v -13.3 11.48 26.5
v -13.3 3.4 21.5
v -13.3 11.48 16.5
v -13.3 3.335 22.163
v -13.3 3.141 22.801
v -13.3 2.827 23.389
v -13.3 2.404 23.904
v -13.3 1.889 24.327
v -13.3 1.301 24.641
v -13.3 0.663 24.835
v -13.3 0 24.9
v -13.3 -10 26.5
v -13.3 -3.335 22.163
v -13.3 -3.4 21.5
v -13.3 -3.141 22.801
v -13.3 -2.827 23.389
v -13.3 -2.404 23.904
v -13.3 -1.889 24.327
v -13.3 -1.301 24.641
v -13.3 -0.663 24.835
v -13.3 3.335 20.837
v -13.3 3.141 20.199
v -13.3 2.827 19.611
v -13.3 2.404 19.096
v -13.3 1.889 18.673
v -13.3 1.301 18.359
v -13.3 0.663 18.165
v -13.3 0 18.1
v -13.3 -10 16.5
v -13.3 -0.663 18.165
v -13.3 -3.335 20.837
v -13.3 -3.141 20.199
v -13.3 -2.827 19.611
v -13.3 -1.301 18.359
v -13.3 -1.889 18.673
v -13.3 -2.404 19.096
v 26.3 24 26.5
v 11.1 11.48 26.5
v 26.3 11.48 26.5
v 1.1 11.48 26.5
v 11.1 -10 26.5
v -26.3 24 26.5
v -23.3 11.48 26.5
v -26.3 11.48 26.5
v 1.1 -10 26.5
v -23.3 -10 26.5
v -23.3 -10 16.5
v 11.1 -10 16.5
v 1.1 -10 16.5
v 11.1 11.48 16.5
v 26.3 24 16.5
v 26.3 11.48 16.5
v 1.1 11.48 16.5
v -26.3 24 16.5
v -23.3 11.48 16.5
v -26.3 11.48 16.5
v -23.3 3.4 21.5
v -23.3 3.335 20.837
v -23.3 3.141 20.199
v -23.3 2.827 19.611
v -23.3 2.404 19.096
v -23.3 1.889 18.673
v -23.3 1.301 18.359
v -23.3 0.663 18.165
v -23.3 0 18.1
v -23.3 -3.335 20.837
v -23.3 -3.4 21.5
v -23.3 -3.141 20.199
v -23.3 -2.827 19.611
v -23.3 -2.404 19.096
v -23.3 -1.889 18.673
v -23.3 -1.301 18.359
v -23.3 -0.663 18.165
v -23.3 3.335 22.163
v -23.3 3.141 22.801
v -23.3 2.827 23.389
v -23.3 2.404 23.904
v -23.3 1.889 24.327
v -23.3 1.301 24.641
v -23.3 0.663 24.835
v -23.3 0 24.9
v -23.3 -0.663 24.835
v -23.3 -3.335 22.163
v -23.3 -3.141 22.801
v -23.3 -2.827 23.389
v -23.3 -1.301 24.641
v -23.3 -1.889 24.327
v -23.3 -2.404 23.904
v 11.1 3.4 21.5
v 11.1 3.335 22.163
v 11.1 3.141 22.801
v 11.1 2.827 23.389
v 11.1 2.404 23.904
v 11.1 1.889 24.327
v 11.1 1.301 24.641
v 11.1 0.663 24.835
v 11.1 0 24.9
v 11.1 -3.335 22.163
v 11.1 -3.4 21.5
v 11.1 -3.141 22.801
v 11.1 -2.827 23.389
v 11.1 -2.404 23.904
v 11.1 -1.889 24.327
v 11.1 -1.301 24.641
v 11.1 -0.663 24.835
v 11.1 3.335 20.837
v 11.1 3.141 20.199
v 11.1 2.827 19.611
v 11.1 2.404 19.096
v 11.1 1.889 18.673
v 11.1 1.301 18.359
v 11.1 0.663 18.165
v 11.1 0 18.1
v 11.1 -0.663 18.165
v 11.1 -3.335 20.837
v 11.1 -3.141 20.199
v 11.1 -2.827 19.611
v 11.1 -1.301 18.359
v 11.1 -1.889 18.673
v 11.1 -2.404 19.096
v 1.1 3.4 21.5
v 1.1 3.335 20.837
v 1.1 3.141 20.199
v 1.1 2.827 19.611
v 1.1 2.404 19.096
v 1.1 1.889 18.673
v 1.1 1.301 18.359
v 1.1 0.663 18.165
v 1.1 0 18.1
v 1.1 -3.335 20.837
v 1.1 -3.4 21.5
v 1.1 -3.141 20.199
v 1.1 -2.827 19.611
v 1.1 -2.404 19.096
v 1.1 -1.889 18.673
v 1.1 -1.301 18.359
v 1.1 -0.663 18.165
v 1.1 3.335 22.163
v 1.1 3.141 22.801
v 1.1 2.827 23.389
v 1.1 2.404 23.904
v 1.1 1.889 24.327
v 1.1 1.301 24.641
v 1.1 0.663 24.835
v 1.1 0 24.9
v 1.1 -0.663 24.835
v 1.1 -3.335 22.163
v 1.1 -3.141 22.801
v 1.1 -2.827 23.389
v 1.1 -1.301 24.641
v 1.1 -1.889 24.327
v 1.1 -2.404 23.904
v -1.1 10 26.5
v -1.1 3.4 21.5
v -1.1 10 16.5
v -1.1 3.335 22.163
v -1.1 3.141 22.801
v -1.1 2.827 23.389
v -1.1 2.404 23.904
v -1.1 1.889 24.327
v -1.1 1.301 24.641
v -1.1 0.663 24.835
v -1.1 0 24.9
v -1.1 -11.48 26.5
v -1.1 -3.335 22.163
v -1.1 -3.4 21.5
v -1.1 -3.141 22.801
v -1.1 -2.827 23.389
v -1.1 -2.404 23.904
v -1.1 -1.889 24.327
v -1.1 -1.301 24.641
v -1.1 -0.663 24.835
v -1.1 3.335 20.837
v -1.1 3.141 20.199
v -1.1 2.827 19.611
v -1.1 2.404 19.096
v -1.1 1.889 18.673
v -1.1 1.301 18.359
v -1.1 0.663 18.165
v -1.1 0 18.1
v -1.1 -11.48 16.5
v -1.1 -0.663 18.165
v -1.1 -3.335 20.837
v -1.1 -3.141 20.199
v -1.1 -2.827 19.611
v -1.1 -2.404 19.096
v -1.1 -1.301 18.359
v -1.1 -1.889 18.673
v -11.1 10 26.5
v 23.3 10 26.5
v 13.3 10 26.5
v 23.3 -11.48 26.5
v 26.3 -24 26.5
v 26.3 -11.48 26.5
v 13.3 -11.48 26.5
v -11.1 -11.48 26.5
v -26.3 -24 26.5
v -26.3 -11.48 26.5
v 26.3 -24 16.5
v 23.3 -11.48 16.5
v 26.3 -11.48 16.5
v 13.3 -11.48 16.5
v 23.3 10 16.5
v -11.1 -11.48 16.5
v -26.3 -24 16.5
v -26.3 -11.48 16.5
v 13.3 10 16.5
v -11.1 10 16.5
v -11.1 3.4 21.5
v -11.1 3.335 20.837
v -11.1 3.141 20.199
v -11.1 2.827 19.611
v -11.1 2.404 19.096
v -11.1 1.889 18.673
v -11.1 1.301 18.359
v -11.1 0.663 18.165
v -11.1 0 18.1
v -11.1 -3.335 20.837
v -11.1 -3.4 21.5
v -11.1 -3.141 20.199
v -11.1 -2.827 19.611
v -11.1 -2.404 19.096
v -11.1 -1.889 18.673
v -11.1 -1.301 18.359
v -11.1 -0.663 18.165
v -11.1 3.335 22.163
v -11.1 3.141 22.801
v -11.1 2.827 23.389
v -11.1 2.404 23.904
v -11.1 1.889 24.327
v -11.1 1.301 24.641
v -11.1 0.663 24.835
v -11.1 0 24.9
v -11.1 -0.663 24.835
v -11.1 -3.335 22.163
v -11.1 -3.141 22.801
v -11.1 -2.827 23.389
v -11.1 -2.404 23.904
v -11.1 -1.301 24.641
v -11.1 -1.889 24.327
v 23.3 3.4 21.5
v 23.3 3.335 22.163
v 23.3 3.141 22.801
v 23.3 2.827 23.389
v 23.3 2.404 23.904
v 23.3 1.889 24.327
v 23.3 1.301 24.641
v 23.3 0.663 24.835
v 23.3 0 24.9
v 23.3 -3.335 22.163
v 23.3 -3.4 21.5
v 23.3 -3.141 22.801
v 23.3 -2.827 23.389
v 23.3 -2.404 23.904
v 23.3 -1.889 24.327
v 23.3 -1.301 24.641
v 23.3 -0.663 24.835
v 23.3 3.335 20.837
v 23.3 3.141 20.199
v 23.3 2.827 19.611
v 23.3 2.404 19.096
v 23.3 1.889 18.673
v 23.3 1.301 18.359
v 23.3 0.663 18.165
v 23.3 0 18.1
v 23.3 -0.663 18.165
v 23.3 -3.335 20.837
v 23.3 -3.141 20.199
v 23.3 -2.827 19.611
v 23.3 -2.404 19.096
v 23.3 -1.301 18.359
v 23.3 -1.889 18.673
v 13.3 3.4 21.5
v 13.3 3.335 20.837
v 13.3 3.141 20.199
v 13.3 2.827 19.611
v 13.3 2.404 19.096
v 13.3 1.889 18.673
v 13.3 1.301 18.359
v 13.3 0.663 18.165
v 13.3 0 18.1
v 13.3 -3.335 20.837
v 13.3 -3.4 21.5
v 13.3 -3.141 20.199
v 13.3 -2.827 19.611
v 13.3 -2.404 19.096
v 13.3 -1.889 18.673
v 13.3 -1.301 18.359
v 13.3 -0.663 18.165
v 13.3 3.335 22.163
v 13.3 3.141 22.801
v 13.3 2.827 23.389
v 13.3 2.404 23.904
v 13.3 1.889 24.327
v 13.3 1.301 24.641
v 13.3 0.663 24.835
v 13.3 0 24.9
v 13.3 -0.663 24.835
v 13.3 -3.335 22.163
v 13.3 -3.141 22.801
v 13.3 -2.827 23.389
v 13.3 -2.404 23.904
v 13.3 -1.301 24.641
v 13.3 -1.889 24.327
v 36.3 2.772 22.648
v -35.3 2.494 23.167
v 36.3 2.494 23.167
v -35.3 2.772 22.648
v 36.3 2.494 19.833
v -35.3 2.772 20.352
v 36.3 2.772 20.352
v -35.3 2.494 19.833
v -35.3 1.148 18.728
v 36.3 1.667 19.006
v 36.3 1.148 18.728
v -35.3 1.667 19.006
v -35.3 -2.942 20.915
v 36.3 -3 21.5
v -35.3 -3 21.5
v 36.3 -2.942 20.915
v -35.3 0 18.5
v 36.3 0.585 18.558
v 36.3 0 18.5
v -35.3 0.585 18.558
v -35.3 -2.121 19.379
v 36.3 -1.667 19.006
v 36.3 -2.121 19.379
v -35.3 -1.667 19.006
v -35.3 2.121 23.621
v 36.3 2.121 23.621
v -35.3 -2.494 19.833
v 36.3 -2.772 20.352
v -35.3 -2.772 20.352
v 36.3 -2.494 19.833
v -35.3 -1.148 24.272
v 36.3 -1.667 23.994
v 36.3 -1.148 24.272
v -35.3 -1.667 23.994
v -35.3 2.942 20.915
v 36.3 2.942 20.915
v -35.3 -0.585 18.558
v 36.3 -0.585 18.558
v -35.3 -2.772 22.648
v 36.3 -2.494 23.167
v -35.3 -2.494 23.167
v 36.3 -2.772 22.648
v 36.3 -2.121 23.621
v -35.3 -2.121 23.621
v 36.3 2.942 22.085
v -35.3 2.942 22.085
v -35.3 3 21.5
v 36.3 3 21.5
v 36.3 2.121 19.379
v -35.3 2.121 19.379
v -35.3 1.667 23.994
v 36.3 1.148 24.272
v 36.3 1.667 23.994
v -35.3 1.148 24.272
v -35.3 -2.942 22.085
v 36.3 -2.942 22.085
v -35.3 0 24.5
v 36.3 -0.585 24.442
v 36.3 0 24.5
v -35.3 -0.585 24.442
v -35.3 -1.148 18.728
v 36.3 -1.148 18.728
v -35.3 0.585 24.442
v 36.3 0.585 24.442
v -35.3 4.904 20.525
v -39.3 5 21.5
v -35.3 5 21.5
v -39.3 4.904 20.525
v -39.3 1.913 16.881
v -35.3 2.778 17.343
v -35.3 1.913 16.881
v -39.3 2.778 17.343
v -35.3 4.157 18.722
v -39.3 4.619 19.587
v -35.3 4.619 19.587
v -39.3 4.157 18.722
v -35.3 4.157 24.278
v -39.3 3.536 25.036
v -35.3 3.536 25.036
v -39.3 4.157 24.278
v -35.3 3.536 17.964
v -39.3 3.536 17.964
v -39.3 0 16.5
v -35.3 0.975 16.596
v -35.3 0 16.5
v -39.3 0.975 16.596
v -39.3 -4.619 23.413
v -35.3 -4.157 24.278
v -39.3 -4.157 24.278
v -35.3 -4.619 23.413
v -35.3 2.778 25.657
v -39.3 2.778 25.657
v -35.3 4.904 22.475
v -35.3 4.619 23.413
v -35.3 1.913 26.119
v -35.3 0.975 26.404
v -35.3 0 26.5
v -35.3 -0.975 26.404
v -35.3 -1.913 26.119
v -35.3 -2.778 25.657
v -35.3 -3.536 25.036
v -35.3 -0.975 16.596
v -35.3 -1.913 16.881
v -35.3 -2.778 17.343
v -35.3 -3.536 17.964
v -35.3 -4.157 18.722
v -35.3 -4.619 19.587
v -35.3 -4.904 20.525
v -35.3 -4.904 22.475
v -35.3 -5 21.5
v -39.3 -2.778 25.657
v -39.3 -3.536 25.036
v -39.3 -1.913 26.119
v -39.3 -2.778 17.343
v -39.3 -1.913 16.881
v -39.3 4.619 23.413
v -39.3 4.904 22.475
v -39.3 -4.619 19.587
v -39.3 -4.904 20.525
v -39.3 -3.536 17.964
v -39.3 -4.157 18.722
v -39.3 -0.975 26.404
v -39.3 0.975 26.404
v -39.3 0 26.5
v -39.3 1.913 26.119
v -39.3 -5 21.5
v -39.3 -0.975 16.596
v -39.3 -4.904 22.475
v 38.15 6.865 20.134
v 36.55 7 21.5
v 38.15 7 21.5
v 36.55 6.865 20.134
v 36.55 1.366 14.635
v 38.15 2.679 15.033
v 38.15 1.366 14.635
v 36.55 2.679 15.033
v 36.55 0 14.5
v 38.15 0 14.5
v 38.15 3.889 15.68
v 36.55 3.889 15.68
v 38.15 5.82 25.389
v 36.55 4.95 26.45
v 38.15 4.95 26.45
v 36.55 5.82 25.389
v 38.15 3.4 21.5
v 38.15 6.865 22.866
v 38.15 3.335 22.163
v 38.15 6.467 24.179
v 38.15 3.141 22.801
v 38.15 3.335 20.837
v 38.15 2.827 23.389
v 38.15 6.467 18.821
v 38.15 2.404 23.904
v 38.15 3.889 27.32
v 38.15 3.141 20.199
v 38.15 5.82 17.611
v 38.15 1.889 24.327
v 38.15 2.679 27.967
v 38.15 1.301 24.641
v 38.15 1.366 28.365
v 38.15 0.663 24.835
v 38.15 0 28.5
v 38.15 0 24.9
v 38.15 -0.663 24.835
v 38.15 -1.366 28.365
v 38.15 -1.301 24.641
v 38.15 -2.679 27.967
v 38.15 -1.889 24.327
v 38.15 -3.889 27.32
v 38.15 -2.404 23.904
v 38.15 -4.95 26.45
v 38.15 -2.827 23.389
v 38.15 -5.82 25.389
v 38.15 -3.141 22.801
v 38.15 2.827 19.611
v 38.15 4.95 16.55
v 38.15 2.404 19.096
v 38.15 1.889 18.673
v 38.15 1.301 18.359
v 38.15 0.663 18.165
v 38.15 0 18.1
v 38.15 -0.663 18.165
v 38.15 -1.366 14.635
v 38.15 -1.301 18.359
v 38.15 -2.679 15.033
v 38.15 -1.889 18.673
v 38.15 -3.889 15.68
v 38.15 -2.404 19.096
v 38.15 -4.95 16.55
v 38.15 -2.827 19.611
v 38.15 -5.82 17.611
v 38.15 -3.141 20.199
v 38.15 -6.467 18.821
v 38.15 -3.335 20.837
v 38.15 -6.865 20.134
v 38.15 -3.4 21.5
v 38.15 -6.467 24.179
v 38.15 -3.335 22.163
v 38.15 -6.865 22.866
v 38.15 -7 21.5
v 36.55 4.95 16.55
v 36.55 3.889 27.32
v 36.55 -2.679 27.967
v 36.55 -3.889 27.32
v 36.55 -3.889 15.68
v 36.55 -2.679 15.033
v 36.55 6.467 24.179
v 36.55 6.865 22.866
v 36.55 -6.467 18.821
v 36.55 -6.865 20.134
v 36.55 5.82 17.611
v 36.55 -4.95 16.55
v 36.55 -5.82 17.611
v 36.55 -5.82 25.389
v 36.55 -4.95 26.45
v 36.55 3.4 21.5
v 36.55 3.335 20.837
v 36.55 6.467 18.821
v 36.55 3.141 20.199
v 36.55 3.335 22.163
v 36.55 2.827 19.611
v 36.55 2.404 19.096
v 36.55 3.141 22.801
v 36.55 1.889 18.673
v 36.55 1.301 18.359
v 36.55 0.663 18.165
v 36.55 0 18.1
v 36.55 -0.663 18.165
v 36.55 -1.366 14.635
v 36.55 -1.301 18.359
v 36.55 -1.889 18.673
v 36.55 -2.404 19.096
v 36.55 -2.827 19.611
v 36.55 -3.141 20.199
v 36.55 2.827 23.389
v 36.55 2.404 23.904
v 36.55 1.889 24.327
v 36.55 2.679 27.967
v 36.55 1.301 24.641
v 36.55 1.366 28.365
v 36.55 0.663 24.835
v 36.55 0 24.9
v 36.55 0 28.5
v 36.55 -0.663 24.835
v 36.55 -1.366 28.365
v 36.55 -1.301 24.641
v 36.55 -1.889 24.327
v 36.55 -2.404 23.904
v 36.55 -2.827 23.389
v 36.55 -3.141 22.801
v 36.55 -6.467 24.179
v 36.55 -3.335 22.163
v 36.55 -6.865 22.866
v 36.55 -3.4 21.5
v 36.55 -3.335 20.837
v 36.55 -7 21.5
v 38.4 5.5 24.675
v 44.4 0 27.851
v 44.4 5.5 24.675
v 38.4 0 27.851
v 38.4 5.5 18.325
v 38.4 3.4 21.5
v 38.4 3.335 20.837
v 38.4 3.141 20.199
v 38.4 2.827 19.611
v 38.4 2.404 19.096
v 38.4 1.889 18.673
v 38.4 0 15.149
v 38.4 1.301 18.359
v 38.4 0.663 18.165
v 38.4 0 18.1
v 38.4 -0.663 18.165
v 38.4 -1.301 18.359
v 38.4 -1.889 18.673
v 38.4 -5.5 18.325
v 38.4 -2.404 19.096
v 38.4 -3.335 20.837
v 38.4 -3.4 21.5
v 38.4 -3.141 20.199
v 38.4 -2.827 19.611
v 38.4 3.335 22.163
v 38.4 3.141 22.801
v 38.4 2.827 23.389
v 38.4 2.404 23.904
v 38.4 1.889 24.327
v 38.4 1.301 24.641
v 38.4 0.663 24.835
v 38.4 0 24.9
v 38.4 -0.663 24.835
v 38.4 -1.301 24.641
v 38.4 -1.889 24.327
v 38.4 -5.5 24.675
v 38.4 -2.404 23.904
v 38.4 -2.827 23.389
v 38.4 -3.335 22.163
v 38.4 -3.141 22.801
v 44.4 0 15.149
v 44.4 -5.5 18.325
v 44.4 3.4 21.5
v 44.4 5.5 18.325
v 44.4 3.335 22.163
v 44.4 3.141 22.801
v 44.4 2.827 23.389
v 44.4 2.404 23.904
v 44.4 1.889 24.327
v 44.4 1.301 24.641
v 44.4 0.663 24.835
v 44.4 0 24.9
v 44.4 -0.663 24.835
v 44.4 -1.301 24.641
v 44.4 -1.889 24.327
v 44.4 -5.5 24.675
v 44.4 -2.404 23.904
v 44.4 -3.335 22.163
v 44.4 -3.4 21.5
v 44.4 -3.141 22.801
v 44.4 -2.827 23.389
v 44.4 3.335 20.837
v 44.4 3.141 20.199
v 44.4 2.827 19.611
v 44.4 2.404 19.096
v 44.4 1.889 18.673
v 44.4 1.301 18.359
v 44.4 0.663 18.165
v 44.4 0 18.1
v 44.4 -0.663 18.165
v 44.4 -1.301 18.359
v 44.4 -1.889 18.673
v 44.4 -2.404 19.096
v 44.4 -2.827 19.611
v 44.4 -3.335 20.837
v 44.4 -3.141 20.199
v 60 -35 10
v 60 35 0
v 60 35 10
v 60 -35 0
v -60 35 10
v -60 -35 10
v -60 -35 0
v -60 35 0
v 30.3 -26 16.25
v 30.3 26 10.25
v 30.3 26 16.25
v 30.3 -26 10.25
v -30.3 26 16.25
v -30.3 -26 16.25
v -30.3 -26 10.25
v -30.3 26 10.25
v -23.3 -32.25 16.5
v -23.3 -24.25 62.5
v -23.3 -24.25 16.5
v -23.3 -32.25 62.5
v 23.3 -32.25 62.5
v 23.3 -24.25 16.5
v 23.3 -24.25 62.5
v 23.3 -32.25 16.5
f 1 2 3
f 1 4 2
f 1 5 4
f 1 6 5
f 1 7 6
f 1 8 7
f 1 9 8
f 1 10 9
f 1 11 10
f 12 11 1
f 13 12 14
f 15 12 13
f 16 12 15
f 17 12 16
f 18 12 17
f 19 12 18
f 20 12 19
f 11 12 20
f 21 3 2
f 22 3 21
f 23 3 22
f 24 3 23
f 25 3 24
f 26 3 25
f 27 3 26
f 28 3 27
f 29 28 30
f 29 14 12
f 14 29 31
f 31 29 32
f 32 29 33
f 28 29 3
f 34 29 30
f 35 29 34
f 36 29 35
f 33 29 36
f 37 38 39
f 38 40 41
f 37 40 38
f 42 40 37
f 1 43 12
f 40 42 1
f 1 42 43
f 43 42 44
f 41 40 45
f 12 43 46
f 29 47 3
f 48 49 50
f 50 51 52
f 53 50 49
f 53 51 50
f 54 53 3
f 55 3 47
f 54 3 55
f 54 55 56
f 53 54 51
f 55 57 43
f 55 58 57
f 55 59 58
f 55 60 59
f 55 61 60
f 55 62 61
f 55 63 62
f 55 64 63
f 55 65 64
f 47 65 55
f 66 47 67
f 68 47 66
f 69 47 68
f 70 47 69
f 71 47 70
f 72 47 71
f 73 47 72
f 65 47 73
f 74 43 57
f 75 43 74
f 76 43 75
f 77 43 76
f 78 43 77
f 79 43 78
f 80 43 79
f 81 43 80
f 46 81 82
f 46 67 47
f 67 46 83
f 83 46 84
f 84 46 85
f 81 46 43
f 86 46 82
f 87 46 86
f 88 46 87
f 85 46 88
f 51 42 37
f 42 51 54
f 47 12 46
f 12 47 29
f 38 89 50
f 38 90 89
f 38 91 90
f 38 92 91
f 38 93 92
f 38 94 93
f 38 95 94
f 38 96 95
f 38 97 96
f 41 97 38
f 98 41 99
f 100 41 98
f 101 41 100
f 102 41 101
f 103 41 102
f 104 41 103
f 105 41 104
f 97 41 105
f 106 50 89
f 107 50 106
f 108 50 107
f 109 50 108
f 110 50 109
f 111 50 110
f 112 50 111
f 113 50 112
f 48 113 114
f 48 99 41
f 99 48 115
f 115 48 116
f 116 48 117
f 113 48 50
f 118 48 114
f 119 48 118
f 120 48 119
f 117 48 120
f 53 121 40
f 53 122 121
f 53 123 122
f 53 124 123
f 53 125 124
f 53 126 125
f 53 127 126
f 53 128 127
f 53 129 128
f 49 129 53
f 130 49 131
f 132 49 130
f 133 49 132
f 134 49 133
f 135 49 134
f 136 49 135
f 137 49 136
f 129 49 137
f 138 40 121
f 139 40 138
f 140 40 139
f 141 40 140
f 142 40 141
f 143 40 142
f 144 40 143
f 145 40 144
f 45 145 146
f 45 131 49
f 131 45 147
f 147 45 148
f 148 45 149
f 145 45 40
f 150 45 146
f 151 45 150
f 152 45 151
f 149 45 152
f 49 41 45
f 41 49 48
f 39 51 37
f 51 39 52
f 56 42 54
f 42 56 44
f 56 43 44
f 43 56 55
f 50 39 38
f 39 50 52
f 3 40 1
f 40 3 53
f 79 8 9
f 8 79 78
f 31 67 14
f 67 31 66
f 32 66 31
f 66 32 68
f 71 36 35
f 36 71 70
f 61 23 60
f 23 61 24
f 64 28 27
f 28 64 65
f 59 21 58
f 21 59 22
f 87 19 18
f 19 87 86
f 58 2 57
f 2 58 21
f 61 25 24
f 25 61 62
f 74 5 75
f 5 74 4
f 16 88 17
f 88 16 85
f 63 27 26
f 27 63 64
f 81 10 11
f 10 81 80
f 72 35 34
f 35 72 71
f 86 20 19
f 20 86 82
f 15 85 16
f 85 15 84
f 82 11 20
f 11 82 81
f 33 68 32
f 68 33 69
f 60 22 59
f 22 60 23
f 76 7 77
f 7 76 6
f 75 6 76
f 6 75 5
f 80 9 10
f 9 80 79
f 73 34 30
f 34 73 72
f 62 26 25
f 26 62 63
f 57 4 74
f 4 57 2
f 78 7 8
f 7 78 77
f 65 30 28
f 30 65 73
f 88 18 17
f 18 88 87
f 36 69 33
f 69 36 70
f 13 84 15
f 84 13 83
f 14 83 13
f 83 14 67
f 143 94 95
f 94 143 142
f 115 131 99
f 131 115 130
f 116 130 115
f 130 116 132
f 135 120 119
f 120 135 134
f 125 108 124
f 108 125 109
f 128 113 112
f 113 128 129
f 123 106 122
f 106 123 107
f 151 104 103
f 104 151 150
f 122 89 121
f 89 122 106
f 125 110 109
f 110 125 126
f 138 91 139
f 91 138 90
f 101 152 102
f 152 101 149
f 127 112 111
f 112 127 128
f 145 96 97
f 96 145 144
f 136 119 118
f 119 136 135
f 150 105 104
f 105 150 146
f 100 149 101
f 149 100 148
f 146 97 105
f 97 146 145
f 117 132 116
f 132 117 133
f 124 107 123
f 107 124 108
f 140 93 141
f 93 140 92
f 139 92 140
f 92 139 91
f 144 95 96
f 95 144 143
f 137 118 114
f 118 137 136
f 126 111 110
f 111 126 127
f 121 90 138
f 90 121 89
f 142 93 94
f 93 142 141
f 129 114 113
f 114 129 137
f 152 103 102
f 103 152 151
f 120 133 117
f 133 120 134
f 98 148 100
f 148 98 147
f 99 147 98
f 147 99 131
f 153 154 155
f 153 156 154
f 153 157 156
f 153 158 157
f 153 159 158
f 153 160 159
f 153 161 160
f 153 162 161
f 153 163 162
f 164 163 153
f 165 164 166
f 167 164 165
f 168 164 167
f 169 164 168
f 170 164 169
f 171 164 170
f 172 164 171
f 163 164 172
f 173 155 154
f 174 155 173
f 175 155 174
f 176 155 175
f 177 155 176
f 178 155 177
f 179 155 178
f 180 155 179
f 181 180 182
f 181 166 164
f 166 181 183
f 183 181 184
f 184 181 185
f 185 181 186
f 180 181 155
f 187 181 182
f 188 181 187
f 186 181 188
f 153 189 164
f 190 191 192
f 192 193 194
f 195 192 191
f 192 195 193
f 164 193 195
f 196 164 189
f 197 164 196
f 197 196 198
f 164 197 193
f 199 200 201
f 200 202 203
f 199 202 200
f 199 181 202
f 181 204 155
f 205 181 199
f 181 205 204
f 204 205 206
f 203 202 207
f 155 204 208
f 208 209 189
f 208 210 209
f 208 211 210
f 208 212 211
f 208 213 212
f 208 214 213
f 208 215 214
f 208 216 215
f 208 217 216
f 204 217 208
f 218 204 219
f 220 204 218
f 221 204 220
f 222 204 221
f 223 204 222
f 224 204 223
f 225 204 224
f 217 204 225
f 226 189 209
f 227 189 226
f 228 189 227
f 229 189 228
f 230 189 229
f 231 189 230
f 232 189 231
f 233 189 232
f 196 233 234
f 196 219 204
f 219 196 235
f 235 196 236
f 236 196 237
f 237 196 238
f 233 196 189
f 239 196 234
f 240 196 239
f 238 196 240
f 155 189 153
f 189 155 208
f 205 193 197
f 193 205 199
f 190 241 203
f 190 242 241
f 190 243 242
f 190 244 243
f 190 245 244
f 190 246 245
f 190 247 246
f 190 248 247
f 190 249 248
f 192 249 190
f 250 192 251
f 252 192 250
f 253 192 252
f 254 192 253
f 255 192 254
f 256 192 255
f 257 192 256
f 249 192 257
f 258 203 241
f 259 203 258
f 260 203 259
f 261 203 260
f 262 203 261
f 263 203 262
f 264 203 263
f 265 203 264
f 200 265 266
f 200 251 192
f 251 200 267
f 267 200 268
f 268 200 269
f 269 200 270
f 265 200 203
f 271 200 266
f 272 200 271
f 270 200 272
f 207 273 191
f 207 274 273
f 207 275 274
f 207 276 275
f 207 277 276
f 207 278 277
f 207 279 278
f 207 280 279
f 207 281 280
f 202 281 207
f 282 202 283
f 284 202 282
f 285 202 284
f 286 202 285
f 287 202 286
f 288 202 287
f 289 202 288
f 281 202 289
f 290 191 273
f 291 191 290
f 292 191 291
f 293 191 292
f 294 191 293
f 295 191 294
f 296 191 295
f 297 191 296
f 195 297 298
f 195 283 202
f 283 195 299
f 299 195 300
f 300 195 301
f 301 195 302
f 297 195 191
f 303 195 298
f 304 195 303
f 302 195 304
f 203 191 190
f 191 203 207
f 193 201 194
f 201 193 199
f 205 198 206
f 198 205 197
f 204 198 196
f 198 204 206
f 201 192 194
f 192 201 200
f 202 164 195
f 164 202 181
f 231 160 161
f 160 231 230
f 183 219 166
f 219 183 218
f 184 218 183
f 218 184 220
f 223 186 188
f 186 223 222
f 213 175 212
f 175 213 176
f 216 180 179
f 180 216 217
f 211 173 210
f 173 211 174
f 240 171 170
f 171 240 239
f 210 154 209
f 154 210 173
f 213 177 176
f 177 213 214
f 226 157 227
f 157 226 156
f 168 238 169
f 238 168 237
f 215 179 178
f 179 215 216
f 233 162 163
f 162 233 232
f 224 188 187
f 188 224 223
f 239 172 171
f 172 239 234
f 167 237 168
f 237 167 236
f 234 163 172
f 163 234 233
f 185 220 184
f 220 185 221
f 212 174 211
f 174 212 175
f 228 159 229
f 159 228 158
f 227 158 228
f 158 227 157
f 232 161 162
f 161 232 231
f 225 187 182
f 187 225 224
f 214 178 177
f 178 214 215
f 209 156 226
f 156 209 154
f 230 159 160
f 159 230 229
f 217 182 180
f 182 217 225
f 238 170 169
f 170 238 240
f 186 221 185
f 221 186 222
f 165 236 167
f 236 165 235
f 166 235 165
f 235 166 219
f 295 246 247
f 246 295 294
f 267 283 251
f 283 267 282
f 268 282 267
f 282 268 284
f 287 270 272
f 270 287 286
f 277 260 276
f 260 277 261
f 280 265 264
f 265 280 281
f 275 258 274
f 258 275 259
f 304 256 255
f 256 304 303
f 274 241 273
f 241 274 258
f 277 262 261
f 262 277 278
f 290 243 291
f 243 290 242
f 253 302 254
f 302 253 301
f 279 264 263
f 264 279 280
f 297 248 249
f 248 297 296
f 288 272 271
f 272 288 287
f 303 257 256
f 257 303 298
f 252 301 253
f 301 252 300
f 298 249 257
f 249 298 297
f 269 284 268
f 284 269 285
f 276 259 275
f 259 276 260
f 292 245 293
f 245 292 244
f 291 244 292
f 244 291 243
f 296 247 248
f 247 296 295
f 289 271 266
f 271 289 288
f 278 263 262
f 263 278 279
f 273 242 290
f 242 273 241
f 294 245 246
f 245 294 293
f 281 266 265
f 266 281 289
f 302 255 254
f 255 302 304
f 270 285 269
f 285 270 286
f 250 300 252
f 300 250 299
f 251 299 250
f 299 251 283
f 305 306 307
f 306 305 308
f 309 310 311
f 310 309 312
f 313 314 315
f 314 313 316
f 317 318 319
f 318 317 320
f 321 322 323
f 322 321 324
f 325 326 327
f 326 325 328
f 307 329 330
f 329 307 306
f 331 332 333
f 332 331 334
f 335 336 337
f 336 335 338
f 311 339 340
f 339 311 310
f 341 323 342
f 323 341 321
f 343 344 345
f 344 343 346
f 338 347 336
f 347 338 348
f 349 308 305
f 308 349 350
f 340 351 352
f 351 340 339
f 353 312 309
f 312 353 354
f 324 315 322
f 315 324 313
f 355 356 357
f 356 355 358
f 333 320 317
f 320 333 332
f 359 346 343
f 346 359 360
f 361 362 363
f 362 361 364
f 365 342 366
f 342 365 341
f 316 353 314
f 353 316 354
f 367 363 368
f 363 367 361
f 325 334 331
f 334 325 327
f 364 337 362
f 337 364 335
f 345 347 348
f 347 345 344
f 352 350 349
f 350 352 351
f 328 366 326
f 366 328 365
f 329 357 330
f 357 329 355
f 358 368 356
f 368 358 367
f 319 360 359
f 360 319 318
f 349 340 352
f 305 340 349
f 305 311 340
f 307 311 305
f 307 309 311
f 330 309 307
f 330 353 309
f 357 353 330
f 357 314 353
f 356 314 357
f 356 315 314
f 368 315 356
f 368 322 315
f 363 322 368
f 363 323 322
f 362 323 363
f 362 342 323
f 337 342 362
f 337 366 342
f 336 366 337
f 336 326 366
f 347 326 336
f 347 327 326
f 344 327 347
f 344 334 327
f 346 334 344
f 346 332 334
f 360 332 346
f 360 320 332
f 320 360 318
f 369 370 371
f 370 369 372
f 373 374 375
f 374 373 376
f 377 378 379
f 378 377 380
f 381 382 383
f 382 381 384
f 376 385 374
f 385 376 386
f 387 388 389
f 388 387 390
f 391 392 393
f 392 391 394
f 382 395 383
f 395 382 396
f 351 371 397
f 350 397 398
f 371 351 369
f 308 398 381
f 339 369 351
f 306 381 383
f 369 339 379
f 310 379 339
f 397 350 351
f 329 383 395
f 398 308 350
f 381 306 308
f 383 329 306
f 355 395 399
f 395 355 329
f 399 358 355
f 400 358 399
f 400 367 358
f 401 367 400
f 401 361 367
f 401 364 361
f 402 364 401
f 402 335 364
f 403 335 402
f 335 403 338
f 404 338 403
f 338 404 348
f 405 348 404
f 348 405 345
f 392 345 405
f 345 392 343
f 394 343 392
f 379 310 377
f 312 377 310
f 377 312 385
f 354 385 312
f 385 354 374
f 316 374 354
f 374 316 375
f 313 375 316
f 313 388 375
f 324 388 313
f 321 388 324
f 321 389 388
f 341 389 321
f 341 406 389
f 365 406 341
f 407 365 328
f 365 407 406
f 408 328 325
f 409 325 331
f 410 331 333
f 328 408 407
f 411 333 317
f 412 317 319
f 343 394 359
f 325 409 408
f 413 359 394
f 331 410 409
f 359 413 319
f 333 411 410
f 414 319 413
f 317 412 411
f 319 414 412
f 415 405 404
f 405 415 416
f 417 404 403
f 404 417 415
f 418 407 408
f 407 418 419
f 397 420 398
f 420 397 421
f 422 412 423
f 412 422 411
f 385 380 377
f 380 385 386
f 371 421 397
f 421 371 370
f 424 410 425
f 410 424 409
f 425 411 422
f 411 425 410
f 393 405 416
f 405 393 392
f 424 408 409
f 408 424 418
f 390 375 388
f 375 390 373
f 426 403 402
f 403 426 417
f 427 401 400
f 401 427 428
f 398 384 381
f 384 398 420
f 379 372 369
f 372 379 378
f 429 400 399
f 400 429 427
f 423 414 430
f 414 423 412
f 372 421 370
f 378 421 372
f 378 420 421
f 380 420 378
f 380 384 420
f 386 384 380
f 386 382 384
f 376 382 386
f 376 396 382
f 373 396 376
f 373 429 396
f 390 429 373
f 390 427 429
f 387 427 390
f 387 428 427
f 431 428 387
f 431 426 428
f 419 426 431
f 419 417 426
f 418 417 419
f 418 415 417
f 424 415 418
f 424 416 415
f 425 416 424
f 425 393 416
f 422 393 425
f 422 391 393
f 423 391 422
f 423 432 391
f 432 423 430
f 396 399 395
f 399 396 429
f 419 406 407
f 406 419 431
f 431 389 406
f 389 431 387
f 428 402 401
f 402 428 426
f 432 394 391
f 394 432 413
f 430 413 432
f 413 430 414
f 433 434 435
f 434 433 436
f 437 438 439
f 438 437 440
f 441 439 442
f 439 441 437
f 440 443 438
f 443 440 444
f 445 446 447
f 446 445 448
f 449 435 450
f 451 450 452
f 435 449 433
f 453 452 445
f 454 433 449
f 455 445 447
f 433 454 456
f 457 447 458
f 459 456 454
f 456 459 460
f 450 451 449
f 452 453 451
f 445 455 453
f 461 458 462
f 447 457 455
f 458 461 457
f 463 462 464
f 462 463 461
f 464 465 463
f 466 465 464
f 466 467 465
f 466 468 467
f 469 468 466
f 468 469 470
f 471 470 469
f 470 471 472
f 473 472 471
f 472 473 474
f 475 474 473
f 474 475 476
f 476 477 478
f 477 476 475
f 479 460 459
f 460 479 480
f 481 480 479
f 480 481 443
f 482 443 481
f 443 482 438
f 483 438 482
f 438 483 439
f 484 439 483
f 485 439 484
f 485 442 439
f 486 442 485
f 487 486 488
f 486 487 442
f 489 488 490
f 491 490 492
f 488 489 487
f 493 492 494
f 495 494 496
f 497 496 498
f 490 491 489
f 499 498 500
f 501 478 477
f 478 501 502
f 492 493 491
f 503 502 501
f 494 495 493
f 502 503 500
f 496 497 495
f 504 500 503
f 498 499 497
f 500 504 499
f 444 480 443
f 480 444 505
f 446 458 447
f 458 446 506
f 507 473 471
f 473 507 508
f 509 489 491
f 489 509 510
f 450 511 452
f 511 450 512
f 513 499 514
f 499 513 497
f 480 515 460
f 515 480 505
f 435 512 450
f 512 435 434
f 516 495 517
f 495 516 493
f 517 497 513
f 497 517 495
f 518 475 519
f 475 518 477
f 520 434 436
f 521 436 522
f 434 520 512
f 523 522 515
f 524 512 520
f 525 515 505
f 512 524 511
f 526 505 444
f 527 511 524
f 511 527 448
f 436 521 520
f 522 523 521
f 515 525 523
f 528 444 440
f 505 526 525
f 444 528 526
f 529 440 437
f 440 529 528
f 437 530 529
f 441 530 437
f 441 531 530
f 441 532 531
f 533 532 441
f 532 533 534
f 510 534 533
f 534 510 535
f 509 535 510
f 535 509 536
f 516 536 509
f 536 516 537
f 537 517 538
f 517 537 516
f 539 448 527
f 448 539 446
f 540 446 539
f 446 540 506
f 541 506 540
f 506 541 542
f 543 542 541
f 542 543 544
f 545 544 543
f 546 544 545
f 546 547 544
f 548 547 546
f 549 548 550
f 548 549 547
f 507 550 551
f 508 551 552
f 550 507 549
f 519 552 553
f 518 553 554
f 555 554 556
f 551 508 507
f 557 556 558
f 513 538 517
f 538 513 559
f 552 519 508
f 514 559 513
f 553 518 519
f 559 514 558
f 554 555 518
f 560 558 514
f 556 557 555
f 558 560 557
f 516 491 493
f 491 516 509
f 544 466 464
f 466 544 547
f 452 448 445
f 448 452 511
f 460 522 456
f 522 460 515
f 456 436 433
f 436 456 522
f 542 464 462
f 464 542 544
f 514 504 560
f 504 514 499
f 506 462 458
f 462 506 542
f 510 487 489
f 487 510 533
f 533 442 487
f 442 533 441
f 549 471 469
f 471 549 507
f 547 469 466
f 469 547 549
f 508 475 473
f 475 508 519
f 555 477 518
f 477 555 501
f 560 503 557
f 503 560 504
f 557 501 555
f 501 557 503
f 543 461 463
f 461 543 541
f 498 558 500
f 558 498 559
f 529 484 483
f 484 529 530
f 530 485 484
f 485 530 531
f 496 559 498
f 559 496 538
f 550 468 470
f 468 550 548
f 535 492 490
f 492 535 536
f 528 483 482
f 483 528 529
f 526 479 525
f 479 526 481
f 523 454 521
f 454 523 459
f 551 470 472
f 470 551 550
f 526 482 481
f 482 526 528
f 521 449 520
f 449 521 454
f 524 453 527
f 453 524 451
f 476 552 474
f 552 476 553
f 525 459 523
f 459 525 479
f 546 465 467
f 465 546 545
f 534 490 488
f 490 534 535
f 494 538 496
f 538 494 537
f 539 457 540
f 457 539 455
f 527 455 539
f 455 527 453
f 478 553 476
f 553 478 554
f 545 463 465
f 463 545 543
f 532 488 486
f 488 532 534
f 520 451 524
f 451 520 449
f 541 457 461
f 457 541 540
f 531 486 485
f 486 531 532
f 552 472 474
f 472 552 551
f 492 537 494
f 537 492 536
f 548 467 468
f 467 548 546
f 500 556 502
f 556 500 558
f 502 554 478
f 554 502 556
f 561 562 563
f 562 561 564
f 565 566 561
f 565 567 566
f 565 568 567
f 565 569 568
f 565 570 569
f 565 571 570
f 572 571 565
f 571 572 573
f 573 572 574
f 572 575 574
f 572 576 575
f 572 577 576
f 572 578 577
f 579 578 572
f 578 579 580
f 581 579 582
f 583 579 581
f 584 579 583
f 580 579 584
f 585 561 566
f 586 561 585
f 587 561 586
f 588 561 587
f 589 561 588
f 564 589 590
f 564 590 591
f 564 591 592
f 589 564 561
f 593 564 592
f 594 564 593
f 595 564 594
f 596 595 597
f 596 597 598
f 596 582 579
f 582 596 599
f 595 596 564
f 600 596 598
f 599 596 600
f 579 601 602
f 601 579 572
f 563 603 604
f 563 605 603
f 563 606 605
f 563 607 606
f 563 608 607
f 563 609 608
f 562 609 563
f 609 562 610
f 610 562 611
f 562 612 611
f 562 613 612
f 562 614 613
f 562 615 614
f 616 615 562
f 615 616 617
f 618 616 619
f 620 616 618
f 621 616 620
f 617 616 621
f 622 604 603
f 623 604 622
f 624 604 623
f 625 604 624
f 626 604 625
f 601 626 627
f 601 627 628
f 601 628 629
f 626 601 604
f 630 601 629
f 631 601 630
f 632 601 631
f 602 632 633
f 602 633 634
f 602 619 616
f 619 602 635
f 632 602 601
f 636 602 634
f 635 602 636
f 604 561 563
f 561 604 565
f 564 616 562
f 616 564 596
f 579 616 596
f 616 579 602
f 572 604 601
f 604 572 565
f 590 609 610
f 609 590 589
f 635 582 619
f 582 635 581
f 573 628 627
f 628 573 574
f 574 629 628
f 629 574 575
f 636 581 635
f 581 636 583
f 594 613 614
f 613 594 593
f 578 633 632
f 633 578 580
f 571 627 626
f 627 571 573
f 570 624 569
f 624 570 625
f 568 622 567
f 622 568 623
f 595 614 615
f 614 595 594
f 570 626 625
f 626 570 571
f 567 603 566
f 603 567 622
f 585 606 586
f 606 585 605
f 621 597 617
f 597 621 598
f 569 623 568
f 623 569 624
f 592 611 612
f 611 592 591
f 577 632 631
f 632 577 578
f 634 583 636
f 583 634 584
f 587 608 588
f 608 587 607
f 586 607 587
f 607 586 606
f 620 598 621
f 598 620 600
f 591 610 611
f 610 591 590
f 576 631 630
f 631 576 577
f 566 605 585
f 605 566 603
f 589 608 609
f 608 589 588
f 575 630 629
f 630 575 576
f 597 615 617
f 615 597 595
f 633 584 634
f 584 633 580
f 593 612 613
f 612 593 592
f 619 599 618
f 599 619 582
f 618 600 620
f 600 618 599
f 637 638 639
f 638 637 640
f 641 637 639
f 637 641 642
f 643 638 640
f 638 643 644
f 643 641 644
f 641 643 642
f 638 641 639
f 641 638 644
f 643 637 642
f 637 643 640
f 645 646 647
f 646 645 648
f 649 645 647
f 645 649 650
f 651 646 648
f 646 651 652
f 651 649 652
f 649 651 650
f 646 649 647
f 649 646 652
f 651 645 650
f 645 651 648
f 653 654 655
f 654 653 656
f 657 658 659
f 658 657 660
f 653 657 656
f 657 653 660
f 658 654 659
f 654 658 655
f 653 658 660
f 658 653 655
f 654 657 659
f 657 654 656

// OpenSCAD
$fn = 32;

// ------------------------------------------------------------------------
// Comb hinge with flap: leaf 52.6 x 24 mm, pin d6, flap 46 mm
// Every part is its own module, assembly() places every instance.
// ------------------------------------------------------------------------

// --- part 1 ---
module hinge_bed() {
  difference() {
    translate([-60, -35, 0]) cube([120, 70, 10]);
  }
}

// --- part 2 ---
module hinge_riser() {
  difference() {
    translate([-30.3, -26, 0]) cube([60.6, 52, 6]);
  }
}

// --- part 3 ---
module hinge_leaf_a() {
  difference() {
    union() {
      translate([-23.3, -10, -5]) cube([10, 34, 10]);
      translate([1.1, -10, -5]) cube([10, 34, 10]);
      translate([-26.3, 11.48, -5]) cube([52.6, 12.52, 10]);
    }
    translate([-18.3, 0, 0]) rotate([0, 90, 0]) cylinder(h = 12, d = 6.8, center = true);
    translate([6.1, 0, 0]) rotate([0, 90, 0]) cylinder(h = 12, d = 6.8, center = true);
  }
}

// --- part 4 ---
module hinge_leaf_b() {
  difference() {
    union() {
      translate([-11.1, -24, -5]) cube([10, 34, 10]);
      translate([13.3, -24, -5]) cube([10, 34, 10]);
      translate([-26.3, -24, -5]) cube([52.6, 12.52, 10]);
    }
    translate([-6.1, 0, 0]) rotate([0, 90, 0]) cylinder(h = 12, d = 6.8, center = true);
    translate([18.3, 0, 0]) rotate([0, 90, 0]) cylinder(h = 12, d = 6.8, center = true);
  }
}

// --- part 5 ---
module hinge_flap() {
  difference() {
    translate([-23.3, -23, 0]) cube([46.6, 46, 8]);
  }
}

// --- part 6 ---
module hinge_pin() {
  rotate([0, 90, 0]) cylinder(h = 72.6, d = 6, center = true);
  translate([-39.3, 0, 0]) rotate([0, 90, 0]) cylinder(h = 4, d = 10);
}

// --- part 7 ---
module pin_washer() {
  difference() {
      translate([0, 0, 0]) cylinder(h = 1.6, d = 14);
      translate([0, 0, -1]) cylinder(h = 3.6, d = 6.8);
    }
}

// --- part 8 ---
module pin_nut() {
  difference() {
    linear_extrude(height = 6) polygon(points = [[6.351, 0], [3.175, 5.5], [-3.175, 5.5], [-6.351, 0], [-3.175, -5.5], [3.175, -5.5]]);
    translate([0, 0, -1]) cylinder(h = 8, d = 6.8);
  }
}

// --- assembly ---
module assembly() {
  color([0.80, 0.24, 0.20]) translate([0, 0, 0]) rotate([0, 0, 0]) hinge_bed();
  color([0.20, 0.45, 0.75]) translate([0, 0, 10.25]) rotate([0, 0, 0]) hinge_riser();
  color([0.25, 0.62, 0.32]) translate([0, 0, 21.5]) rotate([0, 0, 0]) hinge_leaf_a();
  color([0.92, 0.70, 0.18]) translate([0, 0, 21.5]) rotate([0, 0, 0]) hinge_leaf_b();
  color([0.58, 0.35, 0.70]) translate([0, -24.25, 39.5]) rotate([90, 0, 0]) hinge_flap();
  color([0.16, 0.66, 0.66]) translate([0, 0, 21.5]) rotate([0, 0, 0]) hinge_pin();
  color([0.85, 0.48, 0.18]) translate([36.55, 0, 21.5]) rotate([0, 90, 0]) pin_washer();
  color([0.55, 0.60, 0.65]) translate([38.4, 0, 21.5]) rotate([0, 90, 0]) pin_nut();
}

assembly();
